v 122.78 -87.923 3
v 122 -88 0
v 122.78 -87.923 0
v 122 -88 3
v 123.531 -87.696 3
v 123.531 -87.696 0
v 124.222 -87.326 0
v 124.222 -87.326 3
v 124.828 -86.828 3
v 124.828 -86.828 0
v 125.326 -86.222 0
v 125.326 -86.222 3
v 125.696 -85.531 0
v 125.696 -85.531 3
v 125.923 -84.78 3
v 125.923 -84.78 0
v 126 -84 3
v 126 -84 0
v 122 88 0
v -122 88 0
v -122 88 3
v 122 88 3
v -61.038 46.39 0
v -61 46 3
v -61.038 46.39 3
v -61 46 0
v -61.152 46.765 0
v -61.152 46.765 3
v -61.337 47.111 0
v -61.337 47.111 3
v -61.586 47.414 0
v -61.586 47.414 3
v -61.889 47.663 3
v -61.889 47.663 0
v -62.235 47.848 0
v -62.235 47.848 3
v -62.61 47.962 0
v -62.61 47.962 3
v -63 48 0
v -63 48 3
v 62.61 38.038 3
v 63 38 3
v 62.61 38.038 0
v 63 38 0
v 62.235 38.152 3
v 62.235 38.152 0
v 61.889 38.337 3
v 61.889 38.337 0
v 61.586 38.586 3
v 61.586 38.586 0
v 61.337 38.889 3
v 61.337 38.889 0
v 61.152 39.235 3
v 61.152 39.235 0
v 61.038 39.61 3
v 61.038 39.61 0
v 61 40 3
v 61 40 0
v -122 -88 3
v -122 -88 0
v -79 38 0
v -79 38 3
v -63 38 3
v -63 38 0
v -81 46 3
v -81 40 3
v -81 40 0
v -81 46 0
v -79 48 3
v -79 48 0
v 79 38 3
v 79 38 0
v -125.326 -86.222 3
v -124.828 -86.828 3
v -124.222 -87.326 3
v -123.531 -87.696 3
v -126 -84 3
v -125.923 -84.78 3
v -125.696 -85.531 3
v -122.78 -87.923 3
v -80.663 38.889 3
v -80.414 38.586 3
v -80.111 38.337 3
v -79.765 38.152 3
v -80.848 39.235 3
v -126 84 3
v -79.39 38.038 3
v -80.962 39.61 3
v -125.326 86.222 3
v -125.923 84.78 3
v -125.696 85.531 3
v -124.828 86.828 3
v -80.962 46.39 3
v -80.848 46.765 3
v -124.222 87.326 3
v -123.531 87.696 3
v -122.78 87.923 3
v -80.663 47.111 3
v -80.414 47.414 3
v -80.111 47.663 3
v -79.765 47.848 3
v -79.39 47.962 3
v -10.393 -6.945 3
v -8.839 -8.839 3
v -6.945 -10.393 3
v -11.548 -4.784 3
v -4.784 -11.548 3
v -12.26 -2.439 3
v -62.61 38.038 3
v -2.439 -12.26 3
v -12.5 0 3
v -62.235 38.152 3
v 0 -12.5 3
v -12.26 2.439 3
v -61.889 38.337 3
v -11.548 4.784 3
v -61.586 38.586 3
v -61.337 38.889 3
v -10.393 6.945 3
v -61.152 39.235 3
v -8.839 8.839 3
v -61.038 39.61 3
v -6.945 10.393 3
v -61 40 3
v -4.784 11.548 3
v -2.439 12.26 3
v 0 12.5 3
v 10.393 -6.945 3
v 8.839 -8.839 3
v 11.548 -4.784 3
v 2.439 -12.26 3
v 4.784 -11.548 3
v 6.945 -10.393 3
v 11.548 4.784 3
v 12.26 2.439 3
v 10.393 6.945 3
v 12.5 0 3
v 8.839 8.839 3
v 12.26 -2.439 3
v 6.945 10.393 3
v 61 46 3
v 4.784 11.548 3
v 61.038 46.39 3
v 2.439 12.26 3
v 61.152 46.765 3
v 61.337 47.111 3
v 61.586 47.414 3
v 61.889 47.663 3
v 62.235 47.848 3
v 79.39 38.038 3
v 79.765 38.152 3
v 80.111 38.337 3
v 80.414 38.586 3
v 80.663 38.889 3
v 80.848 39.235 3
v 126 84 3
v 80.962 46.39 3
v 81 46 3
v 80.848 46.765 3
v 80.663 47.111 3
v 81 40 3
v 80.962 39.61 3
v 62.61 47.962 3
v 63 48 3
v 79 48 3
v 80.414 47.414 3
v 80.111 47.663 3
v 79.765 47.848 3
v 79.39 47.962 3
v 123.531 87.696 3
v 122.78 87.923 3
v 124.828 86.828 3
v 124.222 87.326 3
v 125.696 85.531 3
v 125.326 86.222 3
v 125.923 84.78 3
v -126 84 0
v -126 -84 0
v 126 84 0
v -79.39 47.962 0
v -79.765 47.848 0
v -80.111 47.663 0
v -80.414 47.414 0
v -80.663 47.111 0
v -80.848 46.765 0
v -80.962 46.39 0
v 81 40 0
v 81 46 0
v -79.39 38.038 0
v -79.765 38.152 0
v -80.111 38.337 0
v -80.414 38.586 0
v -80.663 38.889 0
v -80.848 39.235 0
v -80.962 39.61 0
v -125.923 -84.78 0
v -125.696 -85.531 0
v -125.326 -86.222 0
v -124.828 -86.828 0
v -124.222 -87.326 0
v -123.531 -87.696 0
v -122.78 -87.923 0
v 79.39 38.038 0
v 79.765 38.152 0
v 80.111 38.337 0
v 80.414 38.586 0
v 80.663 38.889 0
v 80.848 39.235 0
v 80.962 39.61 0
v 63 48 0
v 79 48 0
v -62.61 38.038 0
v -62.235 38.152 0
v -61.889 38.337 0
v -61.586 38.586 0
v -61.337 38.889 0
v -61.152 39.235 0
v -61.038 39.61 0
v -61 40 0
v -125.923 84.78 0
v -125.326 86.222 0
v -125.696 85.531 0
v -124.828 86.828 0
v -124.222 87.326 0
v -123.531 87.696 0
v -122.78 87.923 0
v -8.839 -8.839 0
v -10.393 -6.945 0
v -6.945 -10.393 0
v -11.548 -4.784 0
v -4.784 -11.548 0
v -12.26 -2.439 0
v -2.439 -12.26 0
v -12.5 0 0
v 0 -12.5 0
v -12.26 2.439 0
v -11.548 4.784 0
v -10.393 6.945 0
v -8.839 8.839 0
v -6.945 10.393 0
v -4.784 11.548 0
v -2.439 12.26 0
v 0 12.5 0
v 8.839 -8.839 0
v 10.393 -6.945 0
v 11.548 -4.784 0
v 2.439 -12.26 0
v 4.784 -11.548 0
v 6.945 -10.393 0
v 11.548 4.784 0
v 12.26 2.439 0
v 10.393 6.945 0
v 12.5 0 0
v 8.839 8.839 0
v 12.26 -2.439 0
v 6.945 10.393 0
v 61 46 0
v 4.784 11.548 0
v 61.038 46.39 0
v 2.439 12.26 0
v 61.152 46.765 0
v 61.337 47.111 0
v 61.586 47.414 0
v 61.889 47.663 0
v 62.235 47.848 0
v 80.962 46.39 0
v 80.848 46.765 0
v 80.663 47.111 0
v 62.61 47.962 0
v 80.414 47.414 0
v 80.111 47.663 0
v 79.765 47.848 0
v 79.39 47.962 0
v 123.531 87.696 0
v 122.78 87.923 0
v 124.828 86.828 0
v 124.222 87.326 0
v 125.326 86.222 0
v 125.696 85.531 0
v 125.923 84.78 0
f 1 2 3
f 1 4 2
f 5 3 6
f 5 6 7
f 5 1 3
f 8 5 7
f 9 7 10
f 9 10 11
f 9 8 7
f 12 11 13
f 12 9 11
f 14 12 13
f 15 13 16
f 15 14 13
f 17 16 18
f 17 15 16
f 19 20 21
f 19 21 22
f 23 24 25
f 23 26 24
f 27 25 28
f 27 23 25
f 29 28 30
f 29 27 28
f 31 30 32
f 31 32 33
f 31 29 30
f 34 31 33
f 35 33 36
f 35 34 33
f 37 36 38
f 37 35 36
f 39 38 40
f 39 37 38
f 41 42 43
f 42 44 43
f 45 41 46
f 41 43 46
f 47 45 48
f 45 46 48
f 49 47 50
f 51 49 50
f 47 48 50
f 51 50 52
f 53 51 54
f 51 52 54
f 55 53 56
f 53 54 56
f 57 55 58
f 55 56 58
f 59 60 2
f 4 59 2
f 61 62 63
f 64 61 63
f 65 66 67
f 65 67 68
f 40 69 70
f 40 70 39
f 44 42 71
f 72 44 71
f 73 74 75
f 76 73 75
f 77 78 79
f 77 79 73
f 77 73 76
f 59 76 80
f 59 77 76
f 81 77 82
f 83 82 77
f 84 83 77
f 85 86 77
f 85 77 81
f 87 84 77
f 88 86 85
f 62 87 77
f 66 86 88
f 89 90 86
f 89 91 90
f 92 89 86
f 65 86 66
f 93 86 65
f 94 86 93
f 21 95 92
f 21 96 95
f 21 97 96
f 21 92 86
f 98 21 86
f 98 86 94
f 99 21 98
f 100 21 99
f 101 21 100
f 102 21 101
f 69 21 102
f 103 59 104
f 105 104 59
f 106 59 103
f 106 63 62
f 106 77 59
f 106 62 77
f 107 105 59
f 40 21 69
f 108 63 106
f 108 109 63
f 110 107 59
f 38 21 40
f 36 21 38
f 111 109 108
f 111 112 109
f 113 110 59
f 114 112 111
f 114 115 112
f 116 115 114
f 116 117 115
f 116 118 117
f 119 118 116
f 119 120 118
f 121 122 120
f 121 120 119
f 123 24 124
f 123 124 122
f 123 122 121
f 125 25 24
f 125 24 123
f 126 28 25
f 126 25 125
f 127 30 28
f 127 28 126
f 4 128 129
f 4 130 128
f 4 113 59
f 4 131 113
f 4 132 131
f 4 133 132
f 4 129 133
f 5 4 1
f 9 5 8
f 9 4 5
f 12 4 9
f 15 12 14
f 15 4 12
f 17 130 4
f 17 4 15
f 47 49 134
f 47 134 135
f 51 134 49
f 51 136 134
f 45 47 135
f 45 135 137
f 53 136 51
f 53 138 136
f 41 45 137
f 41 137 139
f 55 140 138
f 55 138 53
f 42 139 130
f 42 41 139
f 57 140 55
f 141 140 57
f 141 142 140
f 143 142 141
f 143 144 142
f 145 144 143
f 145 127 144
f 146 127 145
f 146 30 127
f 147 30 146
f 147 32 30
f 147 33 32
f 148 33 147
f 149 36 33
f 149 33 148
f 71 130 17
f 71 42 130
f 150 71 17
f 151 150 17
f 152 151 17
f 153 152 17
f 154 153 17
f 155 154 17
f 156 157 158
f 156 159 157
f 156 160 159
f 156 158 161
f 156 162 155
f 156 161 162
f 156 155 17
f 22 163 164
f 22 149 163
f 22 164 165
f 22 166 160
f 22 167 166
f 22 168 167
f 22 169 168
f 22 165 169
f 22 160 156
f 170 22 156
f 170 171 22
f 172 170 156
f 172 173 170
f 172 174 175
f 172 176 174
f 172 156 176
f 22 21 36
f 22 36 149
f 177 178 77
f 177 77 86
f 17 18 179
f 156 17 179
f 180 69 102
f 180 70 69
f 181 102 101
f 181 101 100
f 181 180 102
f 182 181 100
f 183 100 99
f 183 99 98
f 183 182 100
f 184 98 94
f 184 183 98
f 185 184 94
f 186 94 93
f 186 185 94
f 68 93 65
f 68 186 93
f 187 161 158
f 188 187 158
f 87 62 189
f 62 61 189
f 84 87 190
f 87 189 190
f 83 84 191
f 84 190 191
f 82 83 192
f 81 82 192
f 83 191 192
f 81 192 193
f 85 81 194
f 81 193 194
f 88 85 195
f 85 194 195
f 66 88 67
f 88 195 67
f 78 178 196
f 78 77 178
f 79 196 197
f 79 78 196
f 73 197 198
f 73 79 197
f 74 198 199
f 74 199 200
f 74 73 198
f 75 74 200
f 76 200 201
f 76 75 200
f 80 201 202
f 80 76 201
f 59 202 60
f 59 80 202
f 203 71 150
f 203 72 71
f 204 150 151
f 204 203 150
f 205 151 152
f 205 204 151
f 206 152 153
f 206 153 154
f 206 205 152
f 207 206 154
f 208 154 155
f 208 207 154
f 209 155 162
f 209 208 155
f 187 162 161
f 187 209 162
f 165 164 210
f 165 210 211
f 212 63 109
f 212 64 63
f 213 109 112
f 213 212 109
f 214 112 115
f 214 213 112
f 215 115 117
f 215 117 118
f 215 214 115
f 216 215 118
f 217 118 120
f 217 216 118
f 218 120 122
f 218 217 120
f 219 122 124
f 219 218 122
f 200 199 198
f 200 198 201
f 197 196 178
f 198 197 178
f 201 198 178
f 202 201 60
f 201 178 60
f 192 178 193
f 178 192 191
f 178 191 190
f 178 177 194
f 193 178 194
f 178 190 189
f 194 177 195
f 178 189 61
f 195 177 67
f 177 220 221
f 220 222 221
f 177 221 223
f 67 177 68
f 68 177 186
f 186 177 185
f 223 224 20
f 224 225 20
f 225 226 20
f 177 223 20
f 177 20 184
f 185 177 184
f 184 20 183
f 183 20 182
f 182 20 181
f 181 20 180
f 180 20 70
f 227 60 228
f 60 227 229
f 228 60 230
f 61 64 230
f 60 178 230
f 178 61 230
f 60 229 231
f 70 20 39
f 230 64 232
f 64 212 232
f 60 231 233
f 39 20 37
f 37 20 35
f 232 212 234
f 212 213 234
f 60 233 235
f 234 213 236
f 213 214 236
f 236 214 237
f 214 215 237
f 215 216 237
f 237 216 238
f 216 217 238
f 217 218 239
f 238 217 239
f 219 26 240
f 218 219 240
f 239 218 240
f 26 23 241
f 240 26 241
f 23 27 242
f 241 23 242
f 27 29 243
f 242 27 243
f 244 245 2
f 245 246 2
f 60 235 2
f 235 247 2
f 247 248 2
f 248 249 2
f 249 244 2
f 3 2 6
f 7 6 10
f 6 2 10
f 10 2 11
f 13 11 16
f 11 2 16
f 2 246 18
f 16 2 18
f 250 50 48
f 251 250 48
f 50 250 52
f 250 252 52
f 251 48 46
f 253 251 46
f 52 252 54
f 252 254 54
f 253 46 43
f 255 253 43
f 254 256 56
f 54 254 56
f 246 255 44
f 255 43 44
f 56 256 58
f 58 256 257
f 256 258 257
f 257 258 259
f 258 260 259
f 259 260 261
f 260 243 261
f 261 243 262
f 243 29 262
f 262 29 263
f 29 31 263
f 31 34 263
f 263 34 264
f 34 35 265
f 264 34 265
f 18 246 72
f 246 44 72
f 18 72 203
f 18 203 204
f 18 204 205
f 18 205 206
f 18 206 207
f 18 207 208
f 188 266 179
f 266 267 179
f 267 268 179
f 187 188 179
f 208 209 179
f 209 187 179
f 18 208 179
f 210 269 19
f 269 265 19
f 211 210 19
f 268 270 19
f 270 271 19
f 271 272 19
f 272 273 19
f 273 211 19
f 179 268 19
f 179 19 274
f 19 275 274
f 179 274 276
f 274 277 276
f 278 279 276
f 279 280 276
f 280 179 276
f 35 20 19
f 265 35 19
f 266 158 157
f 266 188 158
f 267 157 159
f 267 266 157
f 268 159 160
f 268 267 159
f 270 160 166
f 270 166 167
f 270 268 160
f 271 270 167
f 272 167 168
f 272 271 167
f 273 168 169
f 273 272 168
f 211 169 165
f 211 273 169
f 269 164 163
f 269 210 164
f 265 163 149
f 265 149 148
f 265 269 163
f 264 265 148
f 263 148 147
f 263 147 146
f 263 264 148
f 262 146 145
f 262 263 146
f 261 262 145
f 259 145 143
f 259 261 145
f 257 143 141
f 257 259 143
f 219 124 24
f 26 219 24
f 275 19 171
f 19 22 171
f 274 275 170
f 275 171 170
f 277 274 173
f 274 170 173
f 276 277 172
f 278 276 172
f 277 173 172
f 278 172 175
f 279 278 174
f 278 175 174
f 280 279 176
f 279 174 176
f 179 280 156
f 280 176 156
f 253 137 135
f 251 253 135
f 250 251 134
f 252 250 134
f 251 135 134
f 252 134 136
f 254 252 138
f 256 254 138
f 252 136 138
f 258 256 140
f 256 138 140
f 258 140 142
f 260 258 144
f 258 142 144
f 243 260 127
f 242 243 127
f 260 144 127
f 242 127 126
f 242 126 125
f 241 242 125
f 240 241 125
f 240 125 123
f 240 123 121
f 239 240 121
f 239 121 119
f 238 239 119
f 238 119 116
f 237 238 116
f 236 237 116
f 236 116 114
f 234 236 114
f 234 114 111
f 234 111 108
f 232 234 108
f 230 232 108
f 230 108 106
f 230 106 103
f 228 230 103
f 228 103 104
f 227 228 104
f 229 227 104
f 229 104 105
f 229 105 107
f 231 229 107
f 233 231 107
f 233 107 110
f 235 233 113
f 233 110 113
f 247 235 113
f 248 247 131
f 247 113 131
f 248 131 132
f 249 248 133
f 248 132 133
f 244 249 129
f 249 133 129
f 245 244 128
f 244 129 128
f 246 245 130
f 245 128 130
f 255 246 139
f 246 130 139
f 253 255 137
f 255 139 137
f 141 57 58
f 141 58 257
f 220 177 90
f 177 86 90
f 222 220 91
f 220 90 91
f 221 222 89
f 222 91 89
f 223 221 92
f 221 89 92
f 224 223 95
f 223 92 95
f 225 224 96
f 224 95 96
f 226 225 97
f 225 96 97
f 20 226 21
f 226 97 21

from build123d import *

# Parameters (mm, degrees)
SKETCH1_W           = 252
SKETCH1_H           = 176
BOSS_EXTRUDE1_DEPTH = 3
SKETCH2_R           = 12.5
SKETCH2_W           = 20
SKETCH2_H           = 10
CUT_EXTRUDE1_DEPTH  = 4
FILLET2_R           = 2
FILLET3_R           = 4


with BuildPart() as part:
    # Sketch1 → Boss-Extrude1 (new body)
    with BuildSketch(Plane.XY):
        Rectangle(SKETCH1_W, SKETCH1_H)
    extrude(amount=BOSS_EXTRUDE1_DEPTH)

    # Sketch2 → Cut-Extrude1 (cut, through all)
    with BuildSketch(Plane.XY.offset(3)):
        Circle(SKETCH2_R)
        with Locations((-71, 43)):
            Rectangle(SKETCH2_W, SKETCH2_H)
        with Locations((71, 43)):
            Rectangle(SKETCH2_W, SKETCH2_H)
    extrude(amount=-CUT_EXTRUDE1_DEPTH, mode=Mode.SUBTRACT)

    # Fillet2
    fillet2_edges = [part.edges().sort_by_distance(p)[0] for p in [
        (-81, 38, 1.5),
        (-81, 48, 1.5),
        (-61, 48, 1.5),
        (-61, 38, 1.5),
        (81, 48, 1.5),
        (81, 38, 1.5),
        (61, 38, 1.5),
        (61, 48, 1.5),
    ]]
    fillet(fillet2_edges, radius=FILLET2_R)

    # Fillet3
    fillet3_edges = [part.edges().sort_by_distance(p)[0] for p in [
        (126, -88, 1.5),
        (-126, -88, 1.5),
        (-126, 88, 1.5),
        (126, 88, 1.5),
    ]]
    fillet(fillet3_edges, radius=FILLET3_R)


solid = part.part
